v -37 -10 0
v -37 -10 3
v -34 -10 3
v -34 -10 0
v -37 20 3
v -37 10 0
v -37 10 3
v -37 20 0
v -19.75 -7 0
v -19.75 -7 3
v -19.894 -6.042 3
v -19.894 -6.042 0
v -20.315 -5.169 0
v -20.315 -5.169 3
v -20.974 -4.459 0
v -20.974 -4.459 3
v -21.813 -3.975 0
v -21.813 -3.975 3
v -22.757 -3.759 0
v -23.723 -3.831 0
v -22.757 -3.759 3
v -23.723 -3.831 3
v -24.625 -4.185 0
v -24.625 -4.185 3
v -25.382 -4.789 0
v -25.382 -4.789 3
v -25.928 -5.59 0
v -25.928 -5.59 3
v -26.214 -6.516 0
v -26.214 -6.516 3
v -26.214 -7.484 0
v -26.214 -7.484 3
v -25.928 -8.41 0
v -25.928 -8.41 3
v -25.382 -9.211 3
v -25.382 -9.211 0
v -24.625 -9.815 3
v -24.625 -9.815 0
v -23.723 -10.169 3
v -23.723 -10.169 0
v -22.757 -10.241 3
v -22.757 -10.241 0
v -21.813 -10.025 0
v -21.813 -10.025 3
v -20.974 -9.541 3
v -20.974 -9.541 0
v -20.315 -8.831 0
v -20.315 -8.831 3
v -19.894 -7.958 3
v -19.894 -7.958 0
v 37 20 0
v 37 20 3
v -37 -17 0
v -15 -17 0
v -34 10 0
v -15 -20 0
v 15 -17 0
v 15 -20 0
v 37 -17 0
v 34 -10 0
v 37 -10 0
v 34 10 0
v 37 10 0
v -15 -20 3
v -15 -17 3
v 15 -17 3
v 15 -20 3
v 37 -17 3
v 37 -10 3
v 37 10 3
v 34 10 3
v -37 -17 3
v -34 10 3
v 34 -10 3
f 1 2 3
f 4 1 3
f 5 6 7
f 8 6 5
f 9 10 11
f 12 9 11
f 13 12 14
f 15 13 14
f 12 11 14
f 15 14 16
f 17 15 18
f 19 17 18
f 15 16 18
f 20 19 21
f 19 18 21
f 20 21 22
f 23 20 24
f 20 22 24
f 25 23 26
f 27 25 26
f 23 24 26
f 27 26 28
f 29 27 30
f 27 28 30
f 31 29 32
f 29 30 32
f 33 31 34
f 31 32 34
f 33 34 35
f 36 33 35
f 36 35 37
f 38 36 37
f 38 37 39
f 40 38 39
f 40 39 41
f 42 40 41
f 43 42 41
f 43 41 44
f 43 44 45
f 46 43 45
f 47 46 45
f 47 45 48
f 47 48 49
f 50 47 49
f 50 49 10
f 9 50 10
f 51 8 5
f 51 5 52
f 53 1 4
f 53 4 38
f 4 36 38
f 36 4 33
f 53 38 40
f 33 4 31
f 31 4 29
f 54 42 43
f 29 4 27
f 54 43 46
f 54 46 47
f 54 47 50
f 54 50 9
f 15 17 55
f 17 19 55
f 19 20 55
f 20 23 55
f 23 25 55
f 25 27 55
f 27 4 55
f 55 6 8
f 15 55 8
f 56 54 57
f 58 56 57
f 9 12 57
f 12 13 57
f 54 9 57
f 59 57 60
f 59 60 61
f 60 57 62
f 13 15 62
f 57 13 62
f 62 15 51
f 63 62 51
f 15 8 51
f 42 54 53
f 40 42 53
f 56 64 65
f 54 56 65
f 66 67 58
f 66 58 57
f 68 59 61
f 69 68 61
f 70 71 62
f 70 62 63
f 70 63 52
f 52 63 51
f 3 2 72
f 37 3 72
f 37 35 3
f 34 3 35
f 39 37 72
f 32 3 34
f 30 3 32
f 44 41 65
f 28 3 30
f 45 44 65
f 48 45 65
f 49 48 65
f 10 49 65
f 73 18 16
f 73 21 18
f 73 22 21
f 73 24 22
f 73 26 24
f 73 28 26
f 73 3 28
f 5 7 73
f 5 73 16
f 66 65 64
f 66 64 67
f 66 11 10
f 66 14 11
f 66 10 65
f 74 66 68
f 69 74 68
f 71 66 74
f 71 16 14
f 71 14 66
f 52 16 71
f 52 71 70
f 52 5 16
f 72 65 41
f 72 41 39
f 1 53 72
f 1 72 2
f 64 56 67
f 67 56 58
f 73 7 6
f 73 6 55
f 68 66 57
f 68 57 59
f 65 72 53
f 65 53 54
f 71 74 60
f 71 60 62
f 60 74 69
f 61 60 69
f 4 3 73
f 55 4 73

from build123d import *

# Parameters (mm, degrees)
ESBO_O1_W                = 74
ESBO_O1_H                = 40
RESSALTO_EXTRUS_O1_DEPTH = 3
ESBO_O2_W                = 22
ESBO_O2_H                = 3
ESBO_O2_W_2              = 3
ESBO_O2_H_2              = 20
CORTE_EXTRUS_O1_DEPTH    = 3
ESBO_O3_R                = 3.25
CORTE_EXTRUS_O2_DEPTH    = 10


with BuildPart() as part:
    # Esboço1 → Ressalto-extrusão1 (new body)
    with BuildSketch(Plane.XY):
        Rectangle(ESBO_O1_W, ESBO_O1_H)
    extrude(amount=RESSALTO_EXTRUS_O1_DEPTH)

    # Esboço2 → Corte-extrusão1 (cut)
    with BuildSketch(Plane.XY.offset(3)):
        with Locations((-26, -18.5)):
            Rectangle(ESBO_O2_W, ESBO_O2_H)
        with Locations((26, -18.5)):
            Rectangle(ESBO_O2_W, ESBO_O2_H)
        with Locations((-35.5, 0)):
            Rectangle(ESBO_O2_W_2, ESBO_O2_H_2)
        with Locations((35.5, 0)):
            Rectangle(ESBO_O2_W_2, ESBO_O2_H_2)
    extrude(amount=-CORTE_EXTRUS_O1_DEPTH, mode=Mode.SUBTRACT)

    # Esboço3 → Corte-extrusão2 (cut)
    with BuildSketch(Plane.XY.offset(3)):
        with Locations((-23, -7)):
            Circle(ESBO_O3_R)
    extrude(amount=-CORTE_EXTRUS_O2_DEPTH, mode=Mode.SUBTRACT)


solid = part.part
